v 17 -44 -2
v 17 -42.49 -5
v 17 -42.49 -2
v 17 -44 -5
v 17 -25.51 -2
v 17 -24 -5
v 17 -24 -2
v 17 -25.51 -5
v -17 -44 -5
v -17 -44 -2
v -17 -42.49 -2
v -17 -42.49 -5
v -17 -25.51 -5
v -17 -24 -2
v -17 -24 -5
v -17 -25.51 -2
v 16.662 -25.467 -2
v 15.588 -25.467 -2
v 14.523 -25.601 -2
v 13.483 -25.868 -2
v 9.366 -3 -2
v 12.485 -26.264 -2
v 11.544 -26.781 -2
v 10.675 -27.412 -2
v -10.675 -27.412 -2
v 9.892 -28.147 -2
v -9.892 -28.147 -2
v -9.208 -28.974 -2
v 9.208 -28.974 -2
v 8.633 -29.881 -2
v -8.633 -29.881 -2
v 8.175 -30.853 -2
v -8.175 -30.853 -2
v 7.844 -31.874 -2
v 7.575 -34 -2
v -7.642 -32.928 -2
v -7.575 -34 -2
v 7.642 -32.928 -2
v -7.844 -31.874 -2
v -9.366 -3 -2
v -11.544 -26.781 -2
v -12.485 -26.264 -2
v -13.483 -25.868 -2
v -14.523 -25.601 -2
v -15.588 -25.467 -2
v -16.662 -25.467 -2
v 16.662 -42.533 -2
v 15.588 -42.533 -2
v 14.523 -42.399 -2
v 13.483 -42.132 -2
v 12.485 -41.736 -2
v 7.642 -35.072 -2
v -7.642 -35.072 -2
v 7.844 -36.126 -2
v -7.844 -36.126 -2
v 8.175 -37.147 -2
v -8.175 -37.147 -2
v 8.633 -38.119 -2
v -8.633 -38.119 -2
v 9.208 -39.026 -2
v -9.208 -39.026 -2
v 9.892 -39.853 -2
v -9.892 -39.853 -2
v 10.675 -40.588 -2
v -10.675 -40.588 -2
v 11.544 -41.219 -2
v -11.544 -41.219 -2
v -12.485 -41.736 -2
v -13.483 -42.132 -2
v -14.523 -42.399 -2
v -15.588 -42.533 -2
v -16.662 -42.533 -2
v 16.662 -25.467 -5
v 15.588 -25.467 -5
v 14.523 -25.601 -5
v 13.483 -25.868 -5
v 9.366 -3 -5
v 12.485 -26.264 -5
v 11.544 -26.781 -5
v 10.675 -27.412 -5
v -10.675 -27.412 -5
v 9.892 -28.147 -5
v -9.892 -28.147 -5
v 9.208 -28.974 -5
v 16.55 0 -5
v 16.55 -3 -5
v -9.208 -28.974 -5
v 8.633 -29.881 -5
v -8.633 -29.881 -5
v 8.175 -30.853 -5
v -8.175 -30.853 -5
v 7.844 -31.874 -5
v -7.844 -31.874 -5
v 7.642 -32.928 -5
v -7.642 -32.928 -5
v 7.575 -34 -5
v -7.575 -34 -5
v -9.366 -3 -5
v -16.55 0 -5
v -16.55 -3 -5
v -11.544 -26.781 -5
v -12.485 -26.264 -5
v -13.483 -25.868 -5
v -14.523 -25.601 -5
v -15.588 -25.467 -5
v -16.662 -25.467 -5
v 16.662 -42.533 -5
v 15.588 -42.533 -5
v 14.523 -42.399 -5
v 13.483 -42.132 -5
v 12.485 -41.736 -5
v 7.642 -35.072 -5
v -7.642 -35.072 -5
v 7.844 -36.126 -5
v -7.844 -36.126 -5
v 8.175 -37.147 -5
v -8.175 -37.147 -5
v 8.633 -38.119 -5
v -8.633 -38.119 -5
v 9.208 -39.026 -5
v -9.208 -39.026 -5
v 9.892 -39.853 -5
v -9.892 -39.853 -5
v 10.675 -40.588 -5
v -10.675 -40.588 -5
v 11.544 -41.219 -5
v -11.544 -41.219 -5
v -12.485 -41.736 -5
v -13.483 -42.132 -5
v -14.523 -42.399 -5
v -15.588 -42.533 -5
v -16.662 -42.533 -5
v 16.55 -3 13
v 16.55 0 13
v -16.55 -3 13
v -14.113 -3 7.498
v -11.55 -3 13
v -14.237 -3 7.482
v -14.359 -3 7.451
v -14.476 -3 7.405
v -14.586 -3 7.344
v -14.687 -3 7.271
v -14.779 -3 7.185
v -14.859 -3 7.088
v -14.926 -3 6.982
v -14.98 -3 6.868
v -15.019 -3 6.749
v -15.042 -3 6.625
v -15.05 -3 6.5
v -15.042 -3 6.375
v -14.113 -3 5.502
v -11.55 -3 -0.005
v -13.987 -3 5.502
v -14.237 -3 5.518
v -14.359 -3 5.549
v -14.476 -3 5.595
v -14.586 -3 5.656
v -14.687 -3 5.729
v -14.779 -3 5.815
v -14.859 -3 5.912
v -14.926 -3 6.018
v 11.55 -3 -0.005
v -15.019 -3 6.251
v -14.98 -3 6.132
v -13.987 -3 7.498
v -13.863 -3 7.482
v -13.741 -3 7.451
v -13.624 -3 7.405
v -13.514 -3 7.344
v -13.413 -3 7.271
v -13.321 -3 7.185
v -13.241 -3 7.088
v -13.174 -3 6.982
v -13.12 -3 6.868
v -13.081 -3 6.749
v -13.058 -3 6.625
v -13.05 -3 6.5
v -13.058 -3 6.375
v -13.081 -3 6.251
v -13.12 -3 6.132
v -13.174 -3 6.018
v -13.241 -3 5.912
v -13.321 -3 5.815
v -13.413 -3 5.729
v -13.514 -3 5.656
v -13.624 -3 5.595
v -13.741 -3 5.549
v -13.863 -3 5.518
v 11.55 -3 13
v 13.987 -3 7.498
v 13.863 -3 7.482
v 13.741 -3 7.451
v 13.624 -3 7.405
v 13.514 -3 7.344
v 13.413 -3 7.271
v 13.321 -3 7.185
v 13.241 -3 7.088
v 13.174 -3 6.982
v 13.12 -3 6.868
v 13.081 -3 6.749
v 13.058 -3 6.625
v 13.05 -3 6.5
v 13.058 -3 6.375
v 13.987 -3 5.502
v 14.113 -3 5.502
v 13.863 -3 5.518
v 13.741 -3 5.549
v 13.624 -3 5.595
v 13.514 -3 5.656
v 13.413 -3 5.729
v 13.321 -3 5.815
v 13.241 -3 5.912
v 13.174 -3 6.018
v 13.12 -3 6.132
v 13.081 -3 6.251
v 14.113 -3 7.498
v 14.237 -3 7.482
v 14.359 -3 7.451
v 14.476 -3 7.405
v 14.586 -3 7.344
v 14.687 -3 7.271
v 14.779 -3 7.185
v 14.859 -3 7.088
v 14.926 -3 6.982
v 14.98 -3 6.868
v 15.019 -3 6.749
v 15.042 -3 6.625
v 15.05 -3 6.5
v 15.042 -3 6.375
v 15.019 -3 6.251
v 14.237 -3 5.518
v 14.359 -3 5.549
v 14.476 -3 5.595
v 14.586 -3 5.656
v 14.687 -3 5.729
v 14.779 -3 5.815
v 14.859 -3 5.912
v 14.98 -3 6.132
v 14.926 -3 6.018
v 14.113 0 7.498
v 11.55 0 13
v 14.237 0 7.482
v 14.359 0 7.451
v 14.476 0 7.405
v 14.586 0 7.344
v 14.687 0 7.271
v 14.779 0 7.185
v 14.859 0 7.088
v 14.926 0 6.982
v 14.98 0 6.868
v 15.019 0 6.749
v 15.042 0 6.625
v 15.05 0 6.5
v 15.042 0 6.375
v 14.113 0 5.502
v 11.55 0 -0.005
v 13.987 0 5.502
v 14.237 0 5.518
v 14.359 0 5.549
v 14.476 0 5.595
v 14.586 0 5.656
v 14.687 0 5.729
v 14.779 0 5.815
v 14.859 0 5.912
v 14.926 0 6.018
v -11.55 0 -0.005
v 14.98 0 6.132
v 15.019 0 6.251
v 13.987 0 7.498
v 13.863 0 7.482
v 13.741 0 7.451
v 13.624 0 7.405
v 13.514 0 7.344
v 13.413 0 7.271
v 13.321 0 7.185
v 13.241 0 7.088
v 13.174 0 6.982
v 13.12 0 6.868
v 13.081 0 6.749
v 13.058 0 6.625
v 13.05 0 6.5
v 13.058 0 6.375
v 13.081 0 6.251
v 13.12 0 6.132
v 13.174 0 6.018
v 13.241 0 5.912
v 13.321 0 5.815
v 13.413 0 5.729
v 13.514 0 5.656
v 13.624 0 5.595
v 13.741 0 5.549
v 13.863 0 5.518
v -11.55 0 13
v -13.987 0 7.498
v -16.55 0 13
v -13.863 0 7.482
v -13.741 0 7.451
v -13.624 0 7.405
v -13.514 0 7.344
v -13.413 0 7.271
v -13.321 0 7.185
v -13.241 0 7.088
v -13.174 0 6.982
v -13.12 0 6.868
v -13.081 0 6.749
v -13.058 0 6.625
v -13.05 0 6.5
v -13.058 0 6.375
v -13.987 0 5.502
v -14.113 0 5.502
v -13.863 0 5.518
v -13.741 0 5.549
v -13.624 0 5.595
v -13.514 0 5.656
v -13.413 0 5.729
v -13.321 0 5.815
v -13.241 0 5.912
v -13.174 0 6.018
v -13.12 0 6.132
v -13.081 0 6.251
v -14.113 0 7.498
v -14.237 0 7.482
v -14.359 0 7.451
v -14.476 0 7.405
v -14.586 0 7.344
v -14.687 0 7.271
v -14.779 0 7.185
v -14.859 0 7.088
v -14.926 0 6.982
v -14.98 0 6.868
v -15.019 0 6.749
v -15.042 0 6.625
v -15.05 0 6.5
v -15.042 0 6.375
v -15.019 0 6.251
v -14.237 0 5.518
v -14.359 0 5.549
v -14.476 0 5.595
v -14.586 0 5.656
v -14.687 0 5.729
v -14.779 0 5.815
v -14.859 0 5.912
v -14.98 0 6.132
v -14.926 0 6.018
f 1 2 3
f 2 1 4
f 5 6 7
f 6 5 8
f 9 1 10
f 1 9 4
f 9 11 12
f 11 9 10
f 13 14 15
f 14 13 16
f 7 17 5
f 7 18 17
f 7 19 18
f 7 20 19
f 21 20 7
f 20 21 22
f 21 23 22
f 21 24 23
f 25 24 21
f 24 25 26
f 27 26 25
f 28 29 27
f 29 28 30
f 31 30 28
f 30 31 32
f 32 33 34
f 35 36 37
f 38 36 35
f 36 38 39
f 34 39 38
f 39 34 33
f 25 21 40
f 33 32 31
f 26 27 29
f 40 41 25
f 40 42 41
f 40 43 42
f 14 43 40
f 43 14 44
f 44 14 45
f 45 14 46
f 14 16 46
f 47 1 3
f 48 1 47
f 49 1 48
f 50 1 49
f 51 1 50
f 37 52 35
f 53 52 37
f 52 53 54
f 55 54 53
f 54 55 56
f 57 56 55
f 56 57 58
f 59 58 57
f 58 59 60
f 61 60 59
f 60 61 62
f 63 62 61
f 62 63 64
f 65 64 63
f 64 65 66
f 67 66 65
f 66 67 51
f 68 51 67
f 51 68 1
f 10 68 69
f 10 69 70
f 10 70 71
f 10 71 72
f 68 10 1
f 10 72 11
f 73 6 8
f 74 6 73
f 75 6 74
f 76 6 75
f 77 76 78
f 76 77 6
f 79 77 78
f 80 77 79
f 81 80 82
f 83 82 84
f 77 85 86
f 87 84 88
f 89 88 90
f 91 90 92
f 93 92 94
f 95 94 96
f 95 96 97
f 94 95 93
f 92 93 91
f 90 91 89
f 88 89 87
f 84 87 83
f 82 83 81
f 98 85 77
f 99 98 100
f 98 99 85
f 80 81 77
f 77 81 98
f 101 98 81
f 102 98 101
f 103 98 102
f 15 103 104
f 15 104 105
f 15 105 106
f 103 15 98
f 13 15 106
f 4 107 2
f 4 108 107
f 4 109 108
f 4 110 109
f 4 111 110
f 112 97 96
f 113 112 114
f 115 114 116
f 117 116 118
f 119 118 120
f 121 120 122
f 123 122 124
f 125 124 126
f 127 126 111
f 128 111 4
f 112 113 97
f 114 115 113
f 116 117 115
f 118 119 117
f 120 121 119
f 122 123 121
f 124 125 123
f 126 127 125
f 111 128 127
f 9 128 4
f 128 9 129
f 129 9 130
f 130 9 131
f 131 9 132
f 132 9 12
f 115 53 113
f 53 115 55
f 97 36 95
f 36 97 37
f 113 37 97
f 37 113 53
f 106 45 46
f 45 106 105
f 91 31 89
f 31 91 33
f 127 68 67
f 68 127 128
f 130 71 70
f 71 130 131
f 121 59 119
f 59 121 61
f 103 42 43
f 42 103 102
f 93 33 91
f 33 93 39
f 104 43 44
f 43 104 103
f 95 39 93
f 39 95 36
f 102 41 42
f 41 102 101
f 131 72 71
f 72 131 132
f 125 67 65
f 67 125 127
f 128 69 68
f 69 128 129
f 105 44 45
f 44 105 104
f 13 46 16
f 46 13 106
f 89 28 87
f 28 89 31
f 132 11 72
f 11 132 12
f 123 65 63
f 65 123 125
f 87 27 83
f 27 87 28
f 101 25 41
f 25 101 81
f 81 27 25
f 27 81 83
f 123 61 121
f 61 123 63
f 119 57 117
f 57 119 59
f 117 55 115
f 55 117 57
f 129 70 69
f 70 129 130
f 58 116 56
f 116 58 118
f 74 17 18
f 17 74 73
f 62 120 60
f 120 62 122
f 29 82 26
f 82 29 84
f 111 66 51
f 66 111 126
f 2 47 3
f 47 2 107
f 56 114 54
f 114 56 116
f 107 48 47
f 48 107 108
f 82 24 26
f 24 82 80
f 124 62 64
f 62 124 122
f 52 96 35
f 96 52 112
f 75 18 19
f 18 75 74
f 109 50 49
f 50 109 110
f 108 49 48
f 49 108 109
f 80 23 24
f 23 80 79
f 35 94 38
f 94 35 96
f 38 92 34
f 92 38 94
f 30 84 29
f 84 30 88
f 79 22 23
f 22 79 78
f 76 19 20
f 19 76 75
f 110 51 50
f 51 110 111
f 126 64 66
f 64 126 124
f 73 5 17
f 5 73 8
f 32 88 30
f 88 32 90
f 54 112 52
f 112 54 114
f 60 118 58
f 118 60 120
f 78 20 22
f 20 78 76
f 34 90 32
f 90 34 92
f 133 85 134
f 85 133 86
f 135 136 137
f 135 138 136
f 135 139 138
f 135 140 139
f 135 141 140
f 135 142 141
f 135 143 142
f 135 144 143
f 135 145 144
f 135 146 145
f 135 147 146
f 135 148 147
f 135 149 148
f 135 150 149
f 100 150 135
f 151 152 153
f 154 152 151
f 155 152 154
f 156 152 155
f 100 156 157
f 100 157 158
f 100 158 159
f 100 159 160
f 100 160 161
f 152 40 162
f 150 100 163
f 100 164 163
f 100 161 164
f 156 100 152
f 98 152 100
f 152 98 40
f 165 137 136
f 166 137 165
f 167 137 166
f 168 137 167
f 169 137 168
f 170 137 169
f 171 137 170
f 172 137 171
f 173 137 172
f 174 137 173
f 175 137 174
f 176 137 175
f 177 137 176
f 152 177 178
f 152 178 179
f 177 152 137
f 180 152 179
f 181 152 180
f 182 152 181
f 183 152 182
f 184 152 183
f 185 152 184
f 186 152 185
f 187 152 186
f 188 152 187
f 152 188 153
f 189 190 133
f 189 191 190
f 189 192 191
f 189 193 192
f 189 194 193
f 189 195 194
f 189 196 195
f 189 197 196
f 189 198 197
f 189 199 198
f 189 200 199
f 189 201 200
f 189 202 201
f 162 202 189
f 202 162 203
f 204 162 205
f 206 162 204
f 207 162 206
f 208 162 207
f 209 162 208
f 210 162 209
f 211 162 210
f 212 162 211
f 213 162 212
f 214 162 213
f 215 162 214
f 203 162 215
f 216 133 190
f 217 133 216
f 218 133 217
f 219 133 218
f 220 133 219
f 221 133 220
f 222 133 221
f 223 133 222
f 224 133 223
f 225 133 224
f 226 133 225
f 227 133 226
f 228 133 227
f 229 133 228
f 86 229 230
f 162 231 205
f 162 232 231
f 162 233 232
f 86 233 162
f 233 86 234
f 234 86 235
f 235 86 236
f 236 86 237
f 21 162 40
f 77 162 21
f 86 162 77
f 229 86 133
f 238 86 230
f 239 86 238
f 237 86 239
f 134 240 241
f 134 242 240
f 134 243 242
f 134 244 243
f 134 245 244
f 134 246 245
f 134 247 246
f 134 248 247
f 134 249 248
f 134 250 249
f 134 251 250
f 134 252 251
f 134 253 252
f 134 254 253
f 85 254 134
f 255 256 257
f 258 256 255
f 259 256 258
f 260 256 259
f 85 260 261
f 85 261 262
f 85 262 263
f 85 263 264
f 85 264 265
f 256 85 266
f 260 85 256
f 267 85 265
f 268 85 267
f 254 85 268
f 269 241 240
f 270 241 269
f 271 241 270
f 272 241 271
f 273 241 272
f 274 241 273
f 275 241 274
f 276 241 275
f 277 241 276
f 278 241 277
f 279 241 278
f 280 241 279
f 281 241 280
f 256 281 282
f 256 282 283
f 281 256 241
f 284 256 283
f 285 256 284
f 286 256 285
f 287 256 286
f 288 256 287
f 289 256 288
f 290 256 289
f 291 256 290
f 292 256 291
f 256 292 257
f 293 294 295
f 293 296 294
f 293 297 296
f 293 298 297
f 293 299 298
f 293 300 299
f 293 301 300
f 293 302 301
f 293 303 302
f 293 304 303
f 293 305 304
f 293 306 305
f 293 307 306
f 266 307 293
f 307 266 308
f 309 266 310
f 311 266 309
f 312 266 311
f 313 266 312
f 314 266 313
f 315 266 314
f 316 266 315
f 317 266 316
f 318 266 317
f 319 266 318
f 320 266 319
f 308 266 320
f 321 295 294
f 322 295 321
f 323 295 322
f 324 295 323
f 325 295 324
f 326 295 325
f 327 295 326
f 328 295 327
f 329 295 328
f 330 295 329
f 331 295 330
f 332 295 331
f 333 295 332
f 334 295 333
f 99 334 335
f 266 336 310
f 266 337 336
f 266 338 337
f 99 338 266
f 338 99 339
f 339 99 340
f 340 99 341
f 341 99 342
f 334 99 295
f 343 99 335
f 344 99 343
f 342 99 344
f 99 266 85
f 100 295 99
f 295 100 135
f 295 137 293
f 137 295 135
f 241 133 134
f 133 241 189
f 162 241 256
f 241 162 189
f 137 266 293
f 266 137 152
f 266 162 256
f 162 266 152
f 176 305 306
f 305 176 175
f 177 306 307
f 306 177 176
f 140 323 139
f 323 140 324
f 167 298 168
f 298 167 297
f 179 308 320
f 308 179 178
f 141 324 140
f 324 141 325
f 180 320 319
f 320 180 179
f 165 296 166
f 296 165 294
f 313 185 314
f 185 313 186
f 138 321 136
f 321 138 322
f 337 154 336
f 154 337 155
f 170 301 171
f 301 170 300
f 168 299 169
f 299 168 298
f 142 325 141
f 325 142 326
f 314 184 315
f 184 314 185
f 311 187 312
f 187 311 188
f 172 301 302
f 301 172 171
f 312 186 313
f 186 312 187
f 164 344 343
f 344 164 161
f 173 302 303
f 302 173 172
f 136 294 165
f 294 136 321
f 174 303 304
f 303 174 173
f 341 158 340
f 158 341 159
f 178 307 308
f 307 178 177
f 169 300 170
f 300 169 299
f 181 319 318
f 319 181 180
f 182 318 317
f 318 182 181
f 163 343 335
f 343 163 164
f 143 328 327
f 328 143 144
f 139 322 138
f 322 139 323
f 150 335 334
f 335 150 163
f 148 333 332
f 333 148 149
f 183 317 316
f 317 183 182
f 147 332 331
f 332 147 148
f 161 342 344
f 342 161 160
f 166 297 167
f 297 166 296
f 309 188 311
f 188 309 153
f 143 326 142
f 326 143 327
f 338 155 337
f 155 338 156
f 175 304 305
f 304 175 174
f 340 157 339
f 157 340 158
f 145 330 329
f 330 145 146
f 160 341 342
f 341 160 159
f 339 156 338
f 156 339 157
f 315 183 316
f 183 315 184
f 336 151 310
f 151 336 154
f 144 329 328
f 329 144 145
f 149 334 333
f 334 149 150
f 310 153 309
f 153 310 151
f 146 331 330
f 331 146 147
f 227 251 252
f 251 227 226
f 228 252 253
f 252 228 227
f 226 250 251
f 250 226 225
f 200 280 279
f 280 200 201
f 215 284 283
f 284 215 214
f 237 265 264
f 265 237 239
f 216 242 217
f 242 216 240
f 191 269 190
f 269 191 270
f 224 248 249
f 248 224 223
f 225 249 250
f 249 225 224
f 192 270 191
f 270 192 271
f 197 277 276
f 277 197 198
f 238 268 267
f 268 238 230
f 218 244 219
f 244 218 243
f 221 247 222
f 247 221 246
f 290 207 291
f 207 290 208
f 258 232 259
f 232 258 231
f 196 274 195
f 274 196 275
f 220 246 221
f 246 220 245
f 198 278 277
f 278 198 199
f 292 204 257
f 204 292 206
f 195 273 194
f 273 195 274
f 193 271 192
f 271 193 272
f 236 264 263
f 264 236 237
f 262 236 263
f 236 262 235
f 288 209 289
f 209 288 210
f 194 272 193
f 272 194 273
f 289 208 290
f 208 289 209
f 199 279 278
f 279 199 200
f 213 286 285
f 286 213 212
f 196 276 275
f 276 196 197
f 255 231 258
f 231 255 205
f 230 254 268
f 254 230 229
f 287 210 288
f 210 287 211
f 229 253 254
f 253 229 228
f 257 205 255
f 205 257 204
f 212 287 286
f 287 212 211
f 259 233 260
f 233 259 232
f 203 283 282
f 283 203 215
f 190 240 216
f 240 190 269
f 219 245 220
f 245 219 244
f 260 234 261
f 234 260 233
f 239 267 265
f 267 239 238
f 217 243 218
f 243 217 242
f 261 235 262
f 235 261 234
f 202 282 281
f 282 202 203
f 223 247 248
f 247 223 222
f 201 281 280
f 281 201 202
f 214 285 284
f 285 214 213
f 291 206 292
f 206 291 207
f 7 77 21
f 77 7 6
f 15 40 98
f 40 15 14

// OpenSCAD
/////////////////////////////////////
// VARIABLES

/* [Faceplate] */

//Width of Faceplace
faceWidth = 34;

//Height of Faceplate
faceHeight = 20;

//Thickness of Front Panel
faceDepth = 3;

/* [Ultrasonic Sensor] */

//Diameter of "Eyes" (Makeblock 17.1)
eyeDiameter = 17.1;

//Distance Between Centers of "Eyes" (Makeblock 32.25)
eyeCentersDistance = 32.25;

//Thickness of the attached Circuitboard (Makeblock 2)
eyeBoardThickness = 2;

/* [Middle] */

//Height from Bottom of Faceplate to bottom of Bracket (Makeblock at least 24)
middleHeight = 24;

//Percentage of connection of the middle to the bottom
middleBottomPercentage = .75; //[.50:.01:1.00]

/* [Servo Bracket] */

//Depth of Servo (Makeblock 13)
servoDepth = 13;

//Width of space between bottom brackets(Makeblock 23.1)
servoWidth = 23.1;

//Height/Thickness of lower side brackets
bracketHeight = 3;

//Width of the lower side brackets (Makeblock 5)
bracketWidth = 5;

//Diameter of Screw Holes (Makeblock 2)
screwDiameter = 2.0;


/* [Hidden] */
servoTopHeight = 15;


/////////////////////////////////////
// CONSTANTS

bracketTotalWidth = servoWidth + bracketWidth*2;

bracketLCenterX = 0 - ((bracketTotalWidth/2))+ bracketWidth/2;
bracketRCenterX = 0 + ((bracketTotalWidth/2))- bracketWidth/2;

bracketCenterY = servoDepth/2;

/////////////////////////////////////
// RENDERS
rotate ([90,0,0])
{
translate ([0,-(faceDepth/2)-eyeBoardThickness,middleHeight+(faceHeight/2)]) face();

rotate ([90,0,0]) translate([0-(bracketTotalWidth/2),0,eyeBoardThickness]) middle();

translate ([0,0,(servoTopHeight/2)]) lowerBracket();
}
/////////////////////////////////////
// MODULES

module middle()
{
    linear_extrude(height = faceDepth)
    polygon(points=[[(bracketTotalWidth-(bracketTotalWidth*middleBottomPercentage)),0],[-(faceWidth-bracketTotalWidth)/2,middleHeight],[bracketTotalWidth+(faceWidth-bracketTotalWidth)/2,middleHeight],[(bracketTotalWidth-(1-middleBottomPercentage)*bracketTotalWidth),0]]);
}

module screw()
{
    cylinder (h = bracketHeight*2, r=screwDiameter/2, center = true, $fn=50);
}

module lowerBracket()
{
    difference()
    {
    
        difference()
        {
        
        difference(){
    
            translate ([
                0,
                servoDepth-((servoDepth+faceDepth+eyeBoardThickness)/2),
                (0-(servoTopHeight/2))+ (bracketHeight/2)])
            cube([
                servoWidth + bracketWidth*2,
                servoDepth+faceDepth+eyeBoardThickness,
                bracketHeight], center = true);
            
    
          translate ([0,(servoDepth/2),0])
            servoTop();
    
    

        }  
      translate ([bracketLCenterX,bracketCenterY,(0-(servoTopHeight/2))+ (bracketHeight/2)]) screw();  
        
    }
    translate ([bracketRCenterX,bracketCenterY,(0-(servoTopHeight/2))+ (bracketHeight/2)]) screw();
    }
}

module servoTop()
{
    cube([servoWidth,servoDepth+.01,servoTopHeight+.01], center = true);
}
module face()
{
    difference()
    {
        difference()
        {
            cube([faceWidth,faceDepth,faceHeight], center = true);    
            translate ([-(eyeCentersDistance/2),faceDepth,0]) eyeHole();
            //translate ([0-(eyeCentersDistance/2),15,faceHeight/2]) eyeHole();
        }
    
        translate ([(eyeCentersDistance/2),faceDepth,0]) eyeHole();
    }
}


module eyeHole()
{
    rotate([90,0,0])
    linear_extrude( height = faceDepth*2)
    circle(d=eyeDiameter,$fn=50, center = true);
}
